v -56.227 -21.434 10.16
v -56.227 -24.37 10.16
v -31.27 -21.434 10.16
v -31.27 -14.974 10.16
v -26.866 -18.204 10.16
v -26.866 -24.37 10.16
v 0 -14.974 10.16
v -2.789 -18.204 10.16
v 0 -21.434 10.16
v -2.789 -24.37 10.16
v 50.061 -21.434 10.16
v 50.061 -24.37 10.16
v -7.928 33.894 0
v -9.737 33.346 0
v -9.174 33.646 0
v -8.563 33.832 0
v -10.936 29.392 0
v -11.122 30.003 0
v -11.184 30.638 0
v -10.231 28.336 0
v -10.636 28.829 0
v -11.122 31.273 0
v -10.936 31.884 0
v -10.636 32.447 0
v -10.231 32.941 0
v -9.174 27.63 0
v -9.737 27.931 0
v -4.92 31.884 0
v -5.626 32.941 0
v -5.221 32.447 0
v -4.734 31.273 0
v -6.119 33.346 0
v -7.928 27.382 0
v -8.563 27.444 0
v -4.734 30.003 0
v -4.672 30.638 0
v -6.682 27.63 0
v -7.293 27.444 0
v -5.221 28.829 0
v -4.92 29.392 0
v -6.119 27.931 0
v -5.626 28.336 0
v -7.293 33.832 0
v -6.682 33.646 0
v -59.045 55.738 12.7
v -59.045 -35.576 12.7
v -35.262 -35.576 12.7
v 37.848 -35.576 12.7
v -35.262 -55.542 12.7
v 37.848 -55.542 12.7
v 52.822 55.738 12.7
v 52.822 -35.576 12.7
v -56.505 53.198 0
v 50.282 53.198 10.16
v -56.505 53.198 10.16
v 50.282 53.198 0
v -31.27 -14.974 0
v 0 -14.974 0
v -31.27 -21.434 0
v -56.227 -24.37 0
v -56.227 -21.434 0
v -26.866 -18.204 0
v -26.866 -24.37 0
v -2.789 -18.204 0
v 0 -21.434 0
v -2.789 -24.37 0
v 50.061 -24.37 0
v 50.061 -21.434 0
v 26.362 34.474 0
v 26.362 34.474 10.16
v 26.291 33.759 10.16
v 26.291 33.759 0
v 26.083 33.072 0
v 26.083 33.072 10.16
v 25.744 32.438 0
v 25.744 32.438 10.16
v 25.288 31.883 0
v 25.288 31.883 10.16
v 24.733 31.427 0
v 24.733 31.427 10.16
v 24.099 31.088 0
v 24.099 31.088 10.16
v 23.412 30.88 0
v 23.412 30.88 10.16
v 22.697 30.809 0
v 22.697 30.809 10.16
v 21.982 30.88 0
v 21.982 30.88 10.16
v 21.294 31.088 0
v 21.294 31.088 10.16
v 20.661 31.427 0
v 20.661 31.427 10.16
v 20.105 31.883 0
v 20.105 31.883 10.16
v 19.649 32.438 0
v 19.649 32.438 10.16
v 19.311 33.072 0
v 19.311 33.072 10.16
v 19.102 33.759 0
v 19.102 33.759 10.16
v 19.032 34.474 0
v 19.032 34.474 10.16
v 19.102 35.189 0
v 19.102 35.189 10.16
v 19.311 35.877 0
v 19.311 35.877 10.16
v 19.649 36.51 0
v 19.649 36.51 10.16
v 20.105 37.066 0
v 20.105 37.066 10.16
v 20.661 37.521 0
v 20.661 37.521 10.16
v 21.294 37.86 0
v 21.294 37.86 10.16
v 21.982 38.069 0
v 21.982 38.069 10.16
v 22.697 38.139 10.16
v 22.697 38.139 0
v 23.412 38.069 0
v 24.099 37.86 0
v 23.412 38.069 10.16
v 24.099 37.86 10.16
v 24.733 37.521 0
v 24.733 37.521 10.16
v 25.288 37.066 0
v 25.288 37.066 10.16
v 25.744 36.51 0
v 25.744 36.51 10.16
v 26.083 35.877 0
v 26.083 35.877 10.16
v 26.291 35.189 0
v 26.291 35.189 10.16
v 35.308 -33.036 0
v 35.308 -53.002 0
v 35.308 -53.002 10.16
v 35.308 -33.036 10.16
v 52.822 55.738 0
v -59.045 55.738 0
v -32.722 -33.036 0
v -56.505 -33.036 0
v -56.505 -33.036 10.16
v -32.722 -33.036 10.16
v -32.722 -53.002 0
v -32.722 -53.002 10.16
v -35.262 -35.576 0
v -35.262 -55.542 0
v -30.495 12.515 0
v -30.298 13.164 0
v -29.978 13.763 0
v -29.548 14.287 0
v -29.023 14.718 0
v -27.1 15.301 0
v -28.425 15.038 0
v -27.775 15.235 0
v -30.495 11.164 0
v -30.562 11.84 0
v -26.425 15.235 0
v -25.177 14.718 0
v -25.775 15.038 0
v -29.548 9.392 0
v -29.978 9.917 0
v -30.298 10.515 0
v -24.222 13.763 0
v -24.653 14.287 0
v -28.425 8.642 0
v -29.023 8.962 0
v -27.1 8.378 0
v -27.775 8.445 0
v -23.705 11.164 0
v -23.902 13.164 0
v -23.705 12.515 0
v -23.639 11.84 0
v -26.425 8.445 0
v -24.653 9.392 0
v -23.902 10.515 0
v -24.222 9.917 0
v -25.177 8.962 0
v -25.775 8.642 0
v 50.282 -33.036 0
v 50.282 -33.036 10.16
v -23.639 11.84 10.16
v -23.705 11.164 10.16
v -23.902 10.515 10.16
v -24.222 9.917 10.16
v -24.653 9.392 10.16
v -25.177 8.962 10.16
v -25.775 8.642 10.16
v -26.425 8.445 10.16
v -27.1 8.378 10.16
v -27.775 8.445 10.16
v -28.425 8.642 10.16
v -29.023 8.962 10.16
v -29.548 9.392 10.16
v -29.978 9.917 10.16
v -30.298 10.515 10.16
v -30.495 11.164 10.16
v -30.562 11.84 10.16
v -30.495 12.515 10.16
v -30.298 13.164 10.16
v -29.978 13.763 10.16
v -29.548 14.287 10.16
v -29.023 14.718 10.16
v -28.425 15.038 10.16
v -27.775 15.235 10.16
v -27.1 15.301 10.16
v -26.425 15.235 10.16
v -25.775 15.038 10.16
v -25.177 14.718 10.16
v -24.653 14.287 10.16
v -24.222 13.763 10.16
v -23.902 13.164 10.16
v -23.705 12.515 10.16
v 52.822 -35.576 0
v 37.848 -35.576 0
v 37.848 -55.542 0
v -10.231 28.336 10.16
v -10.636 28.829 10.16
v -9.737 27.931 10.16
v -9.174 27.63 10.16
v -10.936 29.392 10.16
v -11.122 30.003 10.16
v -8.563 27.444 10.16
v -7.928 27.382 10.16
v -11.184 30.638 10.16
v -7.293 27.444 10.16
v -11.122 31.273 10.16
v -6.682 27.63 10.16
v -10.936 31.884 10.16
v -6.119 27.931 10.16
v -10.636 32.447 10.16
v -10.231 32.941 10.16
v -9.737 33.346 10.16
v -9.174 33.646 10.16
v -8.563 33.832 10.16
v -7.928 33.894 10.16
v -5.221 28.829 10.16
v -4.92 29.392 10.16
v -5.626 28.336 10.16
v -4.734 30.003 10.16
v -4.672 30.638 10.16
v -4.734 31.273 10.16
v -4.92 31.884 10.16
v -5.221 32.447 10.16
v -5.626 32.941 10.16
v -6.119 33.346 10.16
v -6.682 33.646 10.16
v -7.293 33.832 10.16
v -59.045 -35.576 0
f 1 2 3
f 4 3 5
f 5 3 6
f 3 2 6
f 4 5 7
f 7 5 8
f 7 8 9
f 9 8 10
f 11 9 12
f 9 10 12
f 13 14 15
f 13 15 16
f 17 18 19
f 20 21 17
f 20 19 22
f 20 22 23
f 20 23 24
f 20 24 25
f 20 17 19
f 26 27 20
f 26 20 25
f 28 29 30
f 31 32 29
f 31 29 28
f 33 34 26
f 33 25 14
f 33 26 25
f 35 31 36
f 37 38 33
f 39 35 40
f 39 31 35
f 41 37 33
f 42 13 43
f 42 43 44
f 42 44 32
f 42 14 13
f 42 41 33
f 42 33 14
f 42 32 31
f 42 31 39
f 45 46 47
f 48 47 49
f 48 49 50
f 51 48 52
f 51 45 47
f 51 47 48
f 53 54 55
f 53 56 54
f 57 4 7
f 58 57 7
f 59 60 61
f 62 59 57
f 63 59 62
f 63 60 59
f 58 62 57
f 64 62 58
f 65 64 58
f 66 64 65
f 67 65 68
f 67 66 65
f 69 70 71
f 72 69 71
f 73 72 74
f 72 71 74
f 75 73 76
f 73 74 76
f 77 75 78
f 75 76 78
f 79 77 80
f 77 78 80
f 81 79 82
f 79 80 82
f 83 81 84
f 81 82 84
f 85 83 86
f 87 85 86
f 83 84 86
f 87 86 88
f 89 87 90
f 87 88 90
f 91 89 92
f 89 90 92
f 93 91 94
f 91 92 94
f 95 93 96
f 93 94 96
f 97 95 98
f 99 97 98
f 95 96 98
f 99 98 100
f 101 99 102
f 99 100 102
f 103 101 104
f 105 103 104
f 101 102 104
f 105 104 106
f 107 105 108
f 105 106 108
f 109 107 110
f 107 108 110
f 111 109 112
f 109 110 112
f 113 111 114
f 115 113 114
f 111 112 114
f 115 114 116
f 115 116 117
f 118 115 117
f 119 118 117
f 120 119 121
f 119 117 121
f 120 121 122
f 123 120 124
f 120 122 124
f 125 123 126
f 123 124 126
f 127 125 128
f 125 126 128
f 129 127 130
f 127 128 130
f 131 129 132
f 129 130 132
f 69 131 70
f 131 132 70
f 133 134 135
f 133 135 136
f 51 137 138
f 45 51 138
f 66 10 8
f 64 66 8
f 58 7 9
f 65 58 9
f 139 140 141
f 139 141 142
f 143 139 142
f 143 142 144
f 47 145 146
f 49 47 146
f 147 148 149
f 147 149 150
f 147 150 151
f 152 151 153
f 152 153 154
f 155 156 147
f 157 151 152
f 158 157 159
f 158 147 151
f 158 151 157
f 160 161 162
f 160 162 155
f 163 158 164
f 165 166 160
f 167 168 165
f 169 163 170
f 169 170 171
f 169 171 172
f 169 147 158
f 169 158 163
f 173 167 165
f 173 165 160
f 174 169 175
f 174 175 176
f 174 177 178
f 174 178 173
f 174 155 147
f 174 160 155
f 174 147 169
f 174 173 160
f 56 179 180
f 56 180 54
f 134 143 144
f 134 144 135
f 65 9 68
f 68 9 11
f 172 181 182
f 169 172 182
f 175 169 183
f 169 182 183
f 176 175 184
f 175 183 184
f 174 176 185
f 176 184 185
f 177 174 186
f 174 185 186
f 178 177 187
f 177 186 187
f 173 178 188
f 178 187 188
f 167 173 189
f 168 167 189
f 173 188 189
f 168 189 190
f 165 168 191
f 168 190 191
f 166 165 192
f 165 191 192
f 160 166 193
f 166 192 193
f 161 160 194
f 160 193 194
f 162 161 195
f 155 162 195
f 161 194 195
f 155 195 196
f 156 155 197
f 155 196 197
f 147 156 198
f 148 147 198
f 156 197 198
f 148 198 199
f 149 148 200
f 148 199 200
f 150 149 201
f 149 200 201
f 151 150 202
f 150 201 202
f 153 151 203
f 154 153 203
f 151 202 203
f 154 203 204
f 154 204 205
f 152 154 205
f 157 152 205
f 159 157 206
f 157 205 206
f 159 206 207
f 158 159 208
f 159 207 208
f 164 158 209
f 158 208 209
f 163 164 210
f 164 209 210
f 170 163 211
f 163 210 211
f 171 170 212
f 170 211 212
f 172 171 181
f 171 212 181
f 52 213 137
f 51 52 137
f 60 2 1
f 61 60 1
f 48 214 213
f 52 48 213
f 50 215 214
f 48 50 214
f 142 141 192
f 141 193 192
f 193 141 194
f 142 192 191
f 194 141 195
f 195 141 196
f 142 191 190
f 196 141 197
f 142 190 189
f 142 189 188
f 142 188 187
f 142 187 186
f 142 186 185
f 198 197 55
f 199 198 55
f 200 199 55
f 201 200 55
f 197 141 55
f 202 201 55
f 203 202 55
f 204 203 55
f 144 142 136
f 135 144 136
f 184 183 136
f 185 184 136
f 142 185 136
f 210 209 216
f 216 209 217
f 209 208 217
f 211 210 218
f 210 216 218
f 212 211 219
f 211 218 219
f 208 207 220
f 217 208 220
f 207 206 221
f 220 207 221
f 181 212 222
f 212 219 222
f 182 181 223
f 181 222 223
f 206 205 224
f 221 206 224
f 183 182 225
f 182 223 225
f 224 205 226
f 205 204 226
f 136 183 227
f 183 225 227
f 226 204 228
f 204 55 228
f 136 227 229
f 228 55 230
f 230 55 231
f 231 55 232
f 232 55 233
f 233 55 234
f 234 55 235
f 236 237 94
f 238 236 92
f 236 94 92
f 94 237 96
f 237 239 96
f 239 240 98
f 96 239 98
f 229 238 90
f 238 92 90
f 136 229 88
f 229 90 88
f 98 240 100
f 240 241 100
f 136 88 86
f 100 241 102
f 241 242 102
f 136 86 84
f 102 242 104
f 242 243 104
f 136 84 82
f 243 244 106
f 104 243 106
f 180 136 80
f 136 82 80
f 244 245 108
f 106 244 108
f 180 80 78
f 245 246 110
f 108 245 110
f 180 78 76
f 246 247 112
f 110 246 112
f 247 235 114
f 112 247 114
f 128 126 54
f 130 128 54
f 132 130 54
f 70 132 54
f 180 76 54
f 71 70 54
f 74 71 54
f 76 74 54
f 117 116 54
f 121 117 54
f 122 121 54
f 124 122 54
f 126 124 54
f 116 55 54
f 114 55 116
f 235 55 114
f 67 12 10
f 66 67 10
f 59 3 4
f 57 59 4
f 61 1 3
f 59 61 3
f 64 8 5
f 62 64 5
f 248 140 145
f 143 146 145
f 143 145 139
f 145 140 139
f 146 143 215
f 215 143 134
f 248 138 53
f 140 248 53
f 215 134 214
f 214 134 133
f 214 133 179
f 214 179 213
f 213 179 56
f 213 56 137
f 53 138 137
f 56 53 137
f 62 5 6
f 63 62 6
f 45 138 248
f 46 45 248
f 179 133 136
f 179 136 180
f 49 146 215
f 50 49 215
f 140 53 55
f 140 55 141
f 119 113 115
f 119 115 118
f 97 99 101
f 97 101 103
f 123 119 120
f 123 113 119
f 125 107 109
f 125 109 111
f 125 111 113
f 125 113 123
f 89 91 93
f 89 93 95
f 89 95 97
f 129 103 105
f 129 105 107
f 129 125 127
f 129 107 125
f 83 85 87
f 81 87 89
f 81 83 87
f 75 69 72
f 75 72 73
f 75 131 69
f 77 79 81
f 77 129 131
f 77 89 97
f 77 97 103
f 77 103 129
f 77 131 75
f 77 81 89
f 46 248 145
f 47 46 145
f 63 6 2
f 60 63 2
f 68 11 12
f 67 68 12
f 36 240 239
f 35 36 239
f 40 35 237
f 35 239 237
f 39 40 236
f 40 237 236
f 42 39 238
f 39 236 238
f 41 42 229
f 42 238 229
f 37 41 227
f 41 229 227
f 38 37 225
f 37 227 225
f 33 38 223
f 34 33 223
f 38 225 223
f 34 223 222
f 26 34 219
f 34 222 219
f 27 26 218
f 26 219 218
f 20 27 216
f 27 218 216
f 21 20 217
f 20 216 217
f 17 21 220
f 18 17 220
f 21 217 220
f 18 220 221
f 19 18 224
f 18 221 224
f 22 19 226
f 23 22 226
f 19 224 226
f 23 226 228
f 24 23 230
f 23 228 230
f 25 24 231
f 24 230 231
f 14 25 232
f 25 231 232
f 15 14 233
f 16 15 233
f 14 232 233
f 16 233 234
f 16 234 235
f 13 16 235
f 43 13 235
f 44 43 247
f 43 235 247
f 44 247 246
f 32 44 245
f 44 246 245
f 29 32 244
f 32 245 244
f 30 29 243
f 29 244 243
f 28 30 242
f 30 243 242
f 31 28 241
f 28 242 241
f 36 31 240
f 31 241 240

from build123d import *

# Parameters (mm, degrees)
F1_DEPTH = 12.7
F2_T     = -2.54
F5_DEPTH = 10.16
F6_R     = 3.6649817861
F6_R_2   = 3.2562149482
F6_R_3   = 3.4614243846
F7_DEPTH = 10.16


with BuildPart() as f1:
    # F0 (on Top) → F1 (new body)
    with BuildSketch(Plane.XY):
        Polygon((-59.0449757874, 55.7384304702), (-59.0449757874, 0), (-59.0449757874, -35.5757325888), (-35.2621860802, -35.5757325888), (-35.2621860802, -55.5415339768), (37.8478728235, -55.5415339768), (37.8478728235, -35.5757325888), (52.8222173452, -35.5757325888), (52.8222173452, 55.7384304702), align=None)
    extrude(amount=F1_DEPTH)

    # F2
    f2_openings = [f1.faces().sort_by_distance(p)[0] for p in [
        (-2.560717, 3.124655, 0),
    ]]
    offset(amount=F2_T, openings=f2_openings, kind=Kind.INTERSECTION)

    # F6 (on face) → F7 (join)
    with BuildSketch(Plane(origin=(0, 0, 10.16), x_dir=(1, 0, 0), z_dir=(0, 0, -1))):
        with Locations((22.6967390627, -34.4741158187)):
            Circle(F6_R)
        with Locations((-7.9281041399, -30.6381266564)):
            Circle(F6_R_2)
        with Locations((-27.1001067013, -11.839626357)):
            Circle(F6_R_3)
    extrude(amount=F7_DEPTH)


with BuildPart() as f5:
    # F4 (on face) → F5 (new body)
    with BuildSketch(Plane(origin=(0, 0, 10.16), x_dir=(1, 0, 0), z_dir=(0, 0, -1))):
        Polygon((-56.2272109091, 24.3700183928), (-56.2272109091, 21.4338712394), (-31.2699638307, 21.4338712394), (-31.2699638307, 14.9743501097), (0, 14.9743501097), (0, 21.4338712394), (50.0613041222, 21.4338712394), (50.0613041222, 24.3700183928), (-2.7893392835, 24.3700183928), (-2.7893392835, 18.2041106746), (-26.8657431006, 18.2041106746), (-26.8657431006, 24.3700183928), align=None)
    extrude(amount=F5_DEPTH)


solid = Compound([f1.part, f5.part])
